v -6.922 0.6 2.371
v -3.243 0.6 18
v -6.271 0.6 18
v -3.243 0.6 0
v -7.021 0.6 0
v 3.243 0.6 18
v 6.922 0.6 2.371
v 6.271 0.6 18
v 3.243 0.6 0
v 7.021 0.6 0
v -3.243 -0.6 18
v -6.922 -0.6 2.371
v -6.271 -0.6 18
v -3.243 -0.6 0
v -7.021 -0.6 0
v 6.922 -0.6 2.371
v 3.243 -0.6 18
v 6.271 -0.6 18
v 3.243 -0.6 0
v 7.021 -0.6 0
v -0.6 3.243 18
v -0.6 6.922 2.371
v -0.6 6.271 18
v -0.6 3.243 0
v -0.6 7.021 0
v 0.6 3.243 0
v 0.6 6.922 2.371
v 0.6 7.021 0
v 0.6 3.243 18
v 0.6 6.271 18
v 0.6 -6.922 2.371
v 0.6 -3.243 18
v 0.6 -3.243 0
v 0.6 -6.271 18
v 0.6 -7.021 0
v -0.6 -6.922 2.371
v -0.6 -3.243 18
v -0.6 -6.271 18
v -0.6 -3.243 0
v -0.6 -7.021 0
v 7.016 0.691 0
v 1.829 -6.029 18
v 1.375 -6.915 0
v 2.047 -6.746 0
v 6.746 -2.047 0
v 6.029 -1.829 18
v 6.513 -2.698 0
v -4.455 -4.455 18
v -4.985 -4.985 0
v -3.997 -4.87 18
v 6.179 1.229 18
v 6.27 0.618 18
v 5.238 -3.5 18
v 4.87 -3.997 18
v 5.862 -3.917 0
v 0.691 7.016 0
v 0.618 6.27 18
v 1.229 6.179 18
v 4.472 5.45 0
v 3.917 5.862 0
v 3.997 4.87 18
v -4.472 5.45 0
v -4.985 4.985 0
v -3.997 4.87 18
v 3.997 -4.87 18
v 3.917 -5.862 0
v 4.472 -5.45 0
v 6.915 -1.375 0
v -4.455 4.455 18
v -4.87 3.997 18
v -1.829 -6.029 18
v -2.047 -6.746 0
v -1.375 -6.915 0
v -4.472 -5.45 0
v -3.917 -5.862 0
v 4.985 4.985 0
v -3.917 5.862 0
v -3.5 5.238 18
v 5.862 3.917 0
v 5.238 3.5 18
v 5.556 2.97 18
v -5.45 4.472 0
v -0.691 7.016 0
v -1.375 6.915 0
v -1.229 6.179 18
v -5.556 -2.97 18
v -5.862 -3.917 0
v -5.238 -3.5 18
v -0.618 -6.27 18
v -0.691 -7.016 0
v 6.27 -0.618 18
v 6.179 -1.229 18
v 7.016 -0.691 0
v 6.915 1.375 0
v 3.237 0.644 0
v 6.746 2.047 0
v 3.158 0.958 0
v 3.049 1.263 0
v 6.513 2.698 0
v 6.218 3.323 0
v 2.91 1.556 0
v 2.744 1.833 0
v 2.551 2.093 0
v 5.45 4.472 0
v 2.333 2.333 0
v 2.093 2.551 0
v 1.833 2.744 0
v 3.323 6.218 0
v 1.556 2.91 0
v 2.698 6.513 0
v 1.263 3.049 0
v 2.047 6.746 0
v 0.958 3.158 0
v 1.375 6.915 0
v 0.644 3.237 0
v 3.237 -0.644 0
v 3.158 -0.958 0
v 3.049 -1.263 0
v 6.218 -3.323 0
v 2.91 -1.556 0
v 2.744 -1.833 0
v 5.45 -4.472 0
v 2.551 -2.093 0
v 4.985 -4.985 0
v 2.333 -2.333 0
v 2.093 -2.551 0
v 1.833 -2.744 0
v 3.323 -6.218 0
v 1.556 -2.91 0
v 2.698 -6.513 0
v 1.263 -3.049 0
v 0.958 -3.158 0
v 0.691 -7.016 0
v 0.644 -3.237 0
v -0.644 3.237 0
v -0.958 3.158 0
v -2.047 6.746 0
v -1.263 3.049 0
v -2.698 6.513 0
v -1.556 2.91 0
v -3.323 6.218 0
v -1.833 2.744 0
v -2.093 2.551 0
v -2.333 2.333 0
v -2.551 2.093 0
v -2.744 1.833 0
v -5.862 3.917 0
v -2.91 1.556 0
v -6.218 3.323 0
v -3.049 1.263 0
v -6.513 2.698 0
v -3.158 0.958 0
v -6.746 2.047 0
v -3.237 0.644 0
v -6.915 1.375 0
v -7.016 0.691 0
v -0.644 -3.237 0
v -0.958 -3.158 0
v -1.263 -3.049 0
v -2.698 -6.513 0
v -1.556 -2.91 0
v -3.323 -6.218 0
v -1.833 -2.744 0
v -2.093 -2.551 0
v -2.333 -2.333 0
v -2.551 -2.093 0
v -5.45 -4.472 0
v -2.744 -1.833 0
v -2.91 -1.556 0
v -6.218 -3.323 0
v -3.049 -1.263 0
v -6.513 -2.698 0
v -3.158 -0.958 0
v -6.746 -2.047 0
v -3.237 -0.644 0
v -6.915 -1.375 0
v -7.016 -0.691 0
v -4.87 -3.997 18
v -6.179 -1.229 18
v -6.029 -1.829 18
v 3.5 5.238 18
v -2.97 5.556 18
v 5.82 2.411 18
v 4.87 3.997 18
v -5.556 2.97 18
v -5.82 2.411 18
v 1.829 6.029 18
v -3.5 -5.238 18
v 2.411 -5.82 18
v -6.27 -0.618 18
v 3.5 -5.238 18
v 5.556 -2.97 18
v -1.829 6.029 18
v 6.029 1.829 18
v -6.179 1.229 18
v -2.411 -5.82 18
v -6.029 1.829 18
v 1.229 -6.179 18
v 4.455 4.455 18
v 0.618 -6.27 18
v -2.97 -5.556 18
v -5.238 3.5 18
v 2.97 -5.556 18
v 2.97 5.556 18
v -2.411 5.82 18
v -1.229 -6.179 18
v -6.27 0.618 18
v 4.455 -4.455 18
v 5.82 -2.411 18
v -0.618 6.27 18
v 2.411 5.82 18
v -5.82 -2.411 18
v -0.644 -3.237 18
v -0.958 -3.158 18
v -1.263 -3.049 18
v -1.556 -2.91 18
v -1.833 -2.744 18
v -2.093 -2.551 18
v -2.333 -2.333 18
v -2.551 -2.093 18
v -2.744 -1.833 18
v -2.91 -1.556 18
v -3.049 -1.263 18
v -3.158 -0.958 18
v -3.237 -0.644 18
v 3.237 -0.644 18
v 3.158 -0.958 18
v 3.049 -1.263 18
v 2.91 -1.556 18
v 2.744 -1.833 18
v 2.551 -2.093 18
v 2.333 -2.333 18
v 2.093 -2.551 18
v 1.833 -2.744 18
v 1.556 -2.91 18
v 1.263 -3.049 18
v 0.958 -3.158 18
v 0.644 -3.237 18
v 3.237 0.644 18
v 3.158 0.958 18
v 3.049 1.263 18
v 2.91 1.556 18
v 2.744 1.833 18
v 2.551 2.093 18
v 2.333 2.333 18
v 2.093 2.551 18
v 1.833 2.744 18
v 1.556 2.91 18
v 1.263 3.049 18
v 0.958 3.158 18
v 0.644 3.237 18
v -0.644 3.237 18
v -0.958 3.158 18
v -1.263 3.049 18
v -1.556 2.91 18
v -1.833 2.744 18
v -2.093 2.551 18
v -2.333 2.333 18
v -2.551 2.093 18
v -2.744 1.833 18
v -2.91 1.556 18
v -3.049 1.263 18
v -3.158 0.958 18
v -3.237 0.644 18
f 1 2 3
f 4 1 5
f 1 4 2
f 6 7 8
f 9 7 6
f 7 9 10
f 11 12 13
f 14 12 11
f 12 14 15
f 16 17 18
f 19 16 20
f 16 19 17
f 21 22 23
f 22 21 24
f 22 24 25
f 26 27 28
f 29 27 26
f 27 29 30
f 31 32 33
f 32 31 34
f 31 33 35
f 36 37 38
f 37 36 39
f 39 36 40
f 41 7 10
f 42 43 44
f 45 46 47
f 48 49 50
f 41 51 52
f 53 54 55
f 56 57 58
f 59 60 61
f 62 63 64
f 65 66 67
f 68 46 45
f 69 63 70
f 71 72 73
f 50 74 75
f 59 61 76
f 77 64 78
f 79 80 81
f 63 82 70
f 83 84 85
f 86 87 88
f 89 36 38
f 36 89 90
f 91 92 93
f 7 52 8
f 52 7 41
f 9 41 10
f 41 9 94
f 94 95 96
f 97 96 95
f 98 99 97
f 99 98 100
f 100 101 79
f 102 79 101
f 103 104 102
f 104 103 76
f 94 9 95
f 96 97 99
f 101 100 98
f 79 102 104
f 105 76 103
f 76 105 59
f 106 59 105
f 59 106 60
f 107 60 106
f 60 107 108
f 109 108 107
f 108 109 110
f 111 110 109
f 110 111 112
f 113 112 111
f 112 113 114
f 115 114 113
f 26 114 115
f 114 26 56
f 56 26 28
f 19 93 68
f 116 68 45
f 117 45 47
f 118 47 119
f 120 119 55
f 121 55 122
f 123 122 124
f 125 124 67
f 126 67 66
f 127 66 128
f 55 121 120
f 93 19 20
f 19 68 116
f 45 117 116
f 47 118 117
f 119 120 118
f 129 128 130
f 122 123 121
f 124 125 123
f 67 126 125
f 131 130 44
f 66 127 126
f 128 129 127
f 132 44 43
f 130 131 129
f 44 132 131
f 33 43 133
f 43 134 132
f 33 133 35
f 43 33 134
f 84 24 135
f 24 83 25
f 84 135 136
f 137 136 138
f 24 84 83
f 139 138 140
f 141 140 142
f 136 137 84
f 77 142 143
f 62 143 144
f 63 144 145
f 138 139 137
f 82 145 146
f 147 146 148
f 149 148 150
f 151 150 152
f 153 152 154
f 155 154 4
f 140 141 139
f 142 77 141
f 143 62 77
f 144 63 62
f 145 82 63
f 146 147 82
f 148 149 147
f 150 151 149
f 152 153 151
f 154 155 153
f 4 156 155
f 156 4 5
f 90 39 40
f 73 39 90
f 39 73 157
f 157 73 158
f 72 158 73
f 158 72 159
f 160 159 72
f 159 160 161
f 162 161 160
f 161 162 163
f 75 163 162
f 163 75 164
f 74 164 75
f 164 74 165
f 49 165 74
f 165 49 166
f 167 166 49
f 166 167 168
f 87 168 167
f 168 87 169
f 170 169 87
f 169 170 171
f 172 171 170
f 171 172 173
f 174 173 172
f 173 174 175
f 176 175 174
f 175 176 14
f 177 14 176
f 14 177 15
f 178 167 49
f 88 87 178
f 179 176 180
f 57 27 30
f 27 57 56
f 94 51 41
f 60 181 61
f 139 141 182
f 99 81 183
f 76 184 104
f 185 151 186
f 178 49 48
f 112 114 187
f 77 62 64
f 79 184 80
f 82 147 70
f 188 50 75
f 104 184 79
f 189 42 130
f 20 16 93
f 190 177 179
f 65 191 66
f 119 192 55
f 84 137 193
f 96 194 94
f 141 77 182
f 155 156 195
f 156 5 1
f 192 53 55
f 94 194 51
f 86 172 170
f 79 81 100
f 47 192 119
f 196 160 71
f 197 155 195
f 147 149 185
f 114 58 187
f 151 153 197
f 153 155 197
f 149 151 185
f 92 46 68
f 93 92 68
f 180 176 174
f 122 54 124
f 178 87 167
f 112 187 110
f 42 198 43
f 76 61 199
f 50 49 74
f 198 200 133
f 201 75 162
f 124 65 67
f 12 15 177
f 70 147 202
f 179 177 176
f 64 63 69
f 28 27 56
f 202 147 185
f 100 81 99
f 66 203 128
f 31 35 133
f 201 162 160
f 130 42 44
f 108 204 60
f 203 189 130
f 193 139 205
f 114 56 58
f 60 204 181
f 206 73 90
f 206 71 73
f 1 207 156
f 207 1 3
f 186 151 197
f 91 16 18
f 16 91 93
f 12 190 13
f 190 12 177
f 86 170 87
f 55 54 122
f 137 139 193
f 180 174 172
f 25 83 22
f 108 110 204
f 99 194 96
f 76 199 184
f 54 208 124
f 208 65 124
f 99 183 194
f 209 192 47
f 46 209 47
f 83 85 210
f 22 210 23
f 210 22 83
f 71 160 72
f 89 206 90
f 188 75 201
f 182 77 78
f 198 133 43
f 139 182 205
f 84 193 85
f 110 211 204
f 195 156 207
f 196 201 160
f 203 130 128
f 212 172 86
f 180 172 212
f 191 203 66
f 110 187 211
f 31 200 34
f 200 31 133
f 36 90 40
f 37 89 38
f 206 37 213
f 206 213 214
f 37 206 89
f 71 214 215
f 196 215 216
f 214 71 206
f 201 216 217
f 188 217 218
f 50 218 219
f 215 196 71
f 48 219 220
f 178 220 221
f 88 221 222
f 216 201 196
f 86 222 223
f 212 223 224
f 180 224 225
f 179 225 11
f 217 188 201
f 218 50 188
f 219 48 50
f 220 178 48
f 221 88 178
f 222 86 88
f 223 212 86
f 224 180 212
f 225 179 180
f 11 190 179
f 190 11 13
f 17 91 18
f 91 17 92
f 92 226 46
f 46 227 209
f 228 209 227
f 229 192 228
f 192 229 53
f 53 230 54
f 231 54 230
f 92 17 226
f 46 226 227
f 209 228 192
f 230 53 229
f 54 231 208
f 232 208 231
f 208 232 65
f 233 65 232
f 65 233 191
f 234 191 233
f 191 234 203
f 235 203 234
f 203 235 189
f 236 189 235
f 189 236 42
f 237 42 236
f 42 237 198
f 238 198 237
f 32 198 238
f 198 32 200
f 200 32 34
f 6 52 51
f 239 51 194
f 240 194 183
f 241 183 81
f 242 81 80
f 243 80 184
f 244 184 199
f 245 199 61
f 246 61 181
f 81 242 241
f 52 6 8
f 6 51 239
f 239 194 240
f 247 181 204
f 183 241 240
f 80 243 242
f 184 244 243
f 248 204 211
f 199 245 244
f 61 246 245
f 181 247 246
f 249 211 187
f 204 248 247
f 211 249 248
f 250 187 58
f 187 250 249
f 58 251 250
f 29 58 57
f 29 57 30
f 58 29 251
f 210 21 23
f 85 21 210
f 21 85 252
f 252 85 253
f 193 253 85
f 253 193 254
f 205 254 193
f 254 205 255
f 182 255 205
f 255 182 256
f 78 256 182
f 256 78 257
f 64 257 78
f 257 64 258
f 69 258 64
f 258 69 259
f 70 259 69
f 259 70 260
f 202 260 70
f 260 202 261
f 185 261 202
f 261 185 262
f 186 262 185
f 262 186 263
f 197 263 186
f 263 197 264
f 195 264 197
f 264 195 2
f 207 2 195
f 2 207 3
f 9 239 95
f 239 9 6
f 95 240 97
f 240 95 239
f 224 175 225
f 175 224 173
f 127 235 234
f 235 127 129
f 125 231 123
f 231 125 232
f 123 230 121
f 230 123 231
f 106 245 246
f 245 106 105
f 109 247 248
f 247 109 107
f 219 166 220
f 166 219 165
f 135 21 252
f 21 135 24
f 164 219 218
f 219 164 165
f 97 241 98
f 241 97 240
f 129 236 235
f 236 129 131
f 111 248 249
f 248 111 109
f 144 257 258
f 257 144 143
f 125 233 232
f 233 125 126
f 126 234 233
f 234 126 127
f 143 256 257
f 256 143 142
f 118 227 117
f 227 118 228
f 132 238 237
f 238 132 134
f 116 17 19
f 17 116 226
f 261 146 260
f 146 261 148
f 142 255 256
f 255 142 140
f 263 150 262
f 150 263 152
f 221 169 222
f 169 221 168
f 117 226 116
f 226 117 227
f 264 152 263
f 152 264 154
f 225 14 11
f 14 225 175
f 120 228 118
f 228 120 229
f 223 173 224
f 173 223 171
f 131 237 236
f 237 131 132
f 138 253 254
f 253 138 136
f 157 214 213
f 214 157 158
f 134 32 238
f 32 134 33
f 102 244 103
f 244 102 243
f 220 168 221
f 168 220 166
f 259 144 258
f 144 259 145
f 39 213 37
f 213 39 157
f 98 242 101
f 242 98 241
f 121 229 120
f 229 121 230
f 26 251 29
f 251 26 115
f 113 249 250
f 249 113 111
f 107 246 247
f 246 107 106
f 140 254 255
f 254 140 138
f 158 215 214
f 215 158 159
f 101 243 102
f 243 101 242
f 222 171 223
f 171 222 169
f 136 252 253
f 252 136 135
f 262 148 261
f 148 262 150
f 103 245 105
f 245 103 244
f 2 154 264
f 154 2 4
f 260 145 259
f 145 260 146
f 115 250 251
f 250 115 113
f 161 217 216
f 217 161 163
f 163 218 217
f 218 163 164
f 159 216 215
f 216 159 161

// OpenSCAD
// 3D-Printed Siphon Strainer -- split-collet tubing clamp
// Source geometry as provided (verbatim), rendered for review.

$fn = 64;

// Tubing
tube_od = 6.35;
clearance = 0.25;

// Collet
clamp_length = 18;
wall = 3;
slot_width = 1.2;
num_slots = 4;
taper = 1.5;

// Collar
collar_length = 12;
collar_clearance = 0.2;

// Derived
bore = tube_od + clearance;
clamp_od = bore + 2*wall;
collar_id = clamp_od - 0.5;

module collet() {
    difference() {
        cylinder(
            h=clamp_length,
            d1=clamp_od+taper,
            d2=clamp_od
        );

        translate([0,0,-0.1])
            cylinder(
                h=clamp_length+0.2,
                d=bore
            );

        for (a=[0:360/num_slots:359]) {
            rotate([0,0,a])
                translate([0,-slot_width/2,-0.1])
                    cube([
                        clamp_od+taper,
                        slot_width,
                        clamp_length+0.2
                    ]);
        }
    }
}

module collar() {
    difference() {
        cylinder(
            h=collar_length,
            d=collar_id+2*wall
        );

        translate([0,0,-0.1])
            cylinder(
                h=collar_length+0.2,
                d=collar_id
            );
    }
}

// Print collet
collet();

// Uncomment to print collar separately
// translate([20,0,0]) collar();
